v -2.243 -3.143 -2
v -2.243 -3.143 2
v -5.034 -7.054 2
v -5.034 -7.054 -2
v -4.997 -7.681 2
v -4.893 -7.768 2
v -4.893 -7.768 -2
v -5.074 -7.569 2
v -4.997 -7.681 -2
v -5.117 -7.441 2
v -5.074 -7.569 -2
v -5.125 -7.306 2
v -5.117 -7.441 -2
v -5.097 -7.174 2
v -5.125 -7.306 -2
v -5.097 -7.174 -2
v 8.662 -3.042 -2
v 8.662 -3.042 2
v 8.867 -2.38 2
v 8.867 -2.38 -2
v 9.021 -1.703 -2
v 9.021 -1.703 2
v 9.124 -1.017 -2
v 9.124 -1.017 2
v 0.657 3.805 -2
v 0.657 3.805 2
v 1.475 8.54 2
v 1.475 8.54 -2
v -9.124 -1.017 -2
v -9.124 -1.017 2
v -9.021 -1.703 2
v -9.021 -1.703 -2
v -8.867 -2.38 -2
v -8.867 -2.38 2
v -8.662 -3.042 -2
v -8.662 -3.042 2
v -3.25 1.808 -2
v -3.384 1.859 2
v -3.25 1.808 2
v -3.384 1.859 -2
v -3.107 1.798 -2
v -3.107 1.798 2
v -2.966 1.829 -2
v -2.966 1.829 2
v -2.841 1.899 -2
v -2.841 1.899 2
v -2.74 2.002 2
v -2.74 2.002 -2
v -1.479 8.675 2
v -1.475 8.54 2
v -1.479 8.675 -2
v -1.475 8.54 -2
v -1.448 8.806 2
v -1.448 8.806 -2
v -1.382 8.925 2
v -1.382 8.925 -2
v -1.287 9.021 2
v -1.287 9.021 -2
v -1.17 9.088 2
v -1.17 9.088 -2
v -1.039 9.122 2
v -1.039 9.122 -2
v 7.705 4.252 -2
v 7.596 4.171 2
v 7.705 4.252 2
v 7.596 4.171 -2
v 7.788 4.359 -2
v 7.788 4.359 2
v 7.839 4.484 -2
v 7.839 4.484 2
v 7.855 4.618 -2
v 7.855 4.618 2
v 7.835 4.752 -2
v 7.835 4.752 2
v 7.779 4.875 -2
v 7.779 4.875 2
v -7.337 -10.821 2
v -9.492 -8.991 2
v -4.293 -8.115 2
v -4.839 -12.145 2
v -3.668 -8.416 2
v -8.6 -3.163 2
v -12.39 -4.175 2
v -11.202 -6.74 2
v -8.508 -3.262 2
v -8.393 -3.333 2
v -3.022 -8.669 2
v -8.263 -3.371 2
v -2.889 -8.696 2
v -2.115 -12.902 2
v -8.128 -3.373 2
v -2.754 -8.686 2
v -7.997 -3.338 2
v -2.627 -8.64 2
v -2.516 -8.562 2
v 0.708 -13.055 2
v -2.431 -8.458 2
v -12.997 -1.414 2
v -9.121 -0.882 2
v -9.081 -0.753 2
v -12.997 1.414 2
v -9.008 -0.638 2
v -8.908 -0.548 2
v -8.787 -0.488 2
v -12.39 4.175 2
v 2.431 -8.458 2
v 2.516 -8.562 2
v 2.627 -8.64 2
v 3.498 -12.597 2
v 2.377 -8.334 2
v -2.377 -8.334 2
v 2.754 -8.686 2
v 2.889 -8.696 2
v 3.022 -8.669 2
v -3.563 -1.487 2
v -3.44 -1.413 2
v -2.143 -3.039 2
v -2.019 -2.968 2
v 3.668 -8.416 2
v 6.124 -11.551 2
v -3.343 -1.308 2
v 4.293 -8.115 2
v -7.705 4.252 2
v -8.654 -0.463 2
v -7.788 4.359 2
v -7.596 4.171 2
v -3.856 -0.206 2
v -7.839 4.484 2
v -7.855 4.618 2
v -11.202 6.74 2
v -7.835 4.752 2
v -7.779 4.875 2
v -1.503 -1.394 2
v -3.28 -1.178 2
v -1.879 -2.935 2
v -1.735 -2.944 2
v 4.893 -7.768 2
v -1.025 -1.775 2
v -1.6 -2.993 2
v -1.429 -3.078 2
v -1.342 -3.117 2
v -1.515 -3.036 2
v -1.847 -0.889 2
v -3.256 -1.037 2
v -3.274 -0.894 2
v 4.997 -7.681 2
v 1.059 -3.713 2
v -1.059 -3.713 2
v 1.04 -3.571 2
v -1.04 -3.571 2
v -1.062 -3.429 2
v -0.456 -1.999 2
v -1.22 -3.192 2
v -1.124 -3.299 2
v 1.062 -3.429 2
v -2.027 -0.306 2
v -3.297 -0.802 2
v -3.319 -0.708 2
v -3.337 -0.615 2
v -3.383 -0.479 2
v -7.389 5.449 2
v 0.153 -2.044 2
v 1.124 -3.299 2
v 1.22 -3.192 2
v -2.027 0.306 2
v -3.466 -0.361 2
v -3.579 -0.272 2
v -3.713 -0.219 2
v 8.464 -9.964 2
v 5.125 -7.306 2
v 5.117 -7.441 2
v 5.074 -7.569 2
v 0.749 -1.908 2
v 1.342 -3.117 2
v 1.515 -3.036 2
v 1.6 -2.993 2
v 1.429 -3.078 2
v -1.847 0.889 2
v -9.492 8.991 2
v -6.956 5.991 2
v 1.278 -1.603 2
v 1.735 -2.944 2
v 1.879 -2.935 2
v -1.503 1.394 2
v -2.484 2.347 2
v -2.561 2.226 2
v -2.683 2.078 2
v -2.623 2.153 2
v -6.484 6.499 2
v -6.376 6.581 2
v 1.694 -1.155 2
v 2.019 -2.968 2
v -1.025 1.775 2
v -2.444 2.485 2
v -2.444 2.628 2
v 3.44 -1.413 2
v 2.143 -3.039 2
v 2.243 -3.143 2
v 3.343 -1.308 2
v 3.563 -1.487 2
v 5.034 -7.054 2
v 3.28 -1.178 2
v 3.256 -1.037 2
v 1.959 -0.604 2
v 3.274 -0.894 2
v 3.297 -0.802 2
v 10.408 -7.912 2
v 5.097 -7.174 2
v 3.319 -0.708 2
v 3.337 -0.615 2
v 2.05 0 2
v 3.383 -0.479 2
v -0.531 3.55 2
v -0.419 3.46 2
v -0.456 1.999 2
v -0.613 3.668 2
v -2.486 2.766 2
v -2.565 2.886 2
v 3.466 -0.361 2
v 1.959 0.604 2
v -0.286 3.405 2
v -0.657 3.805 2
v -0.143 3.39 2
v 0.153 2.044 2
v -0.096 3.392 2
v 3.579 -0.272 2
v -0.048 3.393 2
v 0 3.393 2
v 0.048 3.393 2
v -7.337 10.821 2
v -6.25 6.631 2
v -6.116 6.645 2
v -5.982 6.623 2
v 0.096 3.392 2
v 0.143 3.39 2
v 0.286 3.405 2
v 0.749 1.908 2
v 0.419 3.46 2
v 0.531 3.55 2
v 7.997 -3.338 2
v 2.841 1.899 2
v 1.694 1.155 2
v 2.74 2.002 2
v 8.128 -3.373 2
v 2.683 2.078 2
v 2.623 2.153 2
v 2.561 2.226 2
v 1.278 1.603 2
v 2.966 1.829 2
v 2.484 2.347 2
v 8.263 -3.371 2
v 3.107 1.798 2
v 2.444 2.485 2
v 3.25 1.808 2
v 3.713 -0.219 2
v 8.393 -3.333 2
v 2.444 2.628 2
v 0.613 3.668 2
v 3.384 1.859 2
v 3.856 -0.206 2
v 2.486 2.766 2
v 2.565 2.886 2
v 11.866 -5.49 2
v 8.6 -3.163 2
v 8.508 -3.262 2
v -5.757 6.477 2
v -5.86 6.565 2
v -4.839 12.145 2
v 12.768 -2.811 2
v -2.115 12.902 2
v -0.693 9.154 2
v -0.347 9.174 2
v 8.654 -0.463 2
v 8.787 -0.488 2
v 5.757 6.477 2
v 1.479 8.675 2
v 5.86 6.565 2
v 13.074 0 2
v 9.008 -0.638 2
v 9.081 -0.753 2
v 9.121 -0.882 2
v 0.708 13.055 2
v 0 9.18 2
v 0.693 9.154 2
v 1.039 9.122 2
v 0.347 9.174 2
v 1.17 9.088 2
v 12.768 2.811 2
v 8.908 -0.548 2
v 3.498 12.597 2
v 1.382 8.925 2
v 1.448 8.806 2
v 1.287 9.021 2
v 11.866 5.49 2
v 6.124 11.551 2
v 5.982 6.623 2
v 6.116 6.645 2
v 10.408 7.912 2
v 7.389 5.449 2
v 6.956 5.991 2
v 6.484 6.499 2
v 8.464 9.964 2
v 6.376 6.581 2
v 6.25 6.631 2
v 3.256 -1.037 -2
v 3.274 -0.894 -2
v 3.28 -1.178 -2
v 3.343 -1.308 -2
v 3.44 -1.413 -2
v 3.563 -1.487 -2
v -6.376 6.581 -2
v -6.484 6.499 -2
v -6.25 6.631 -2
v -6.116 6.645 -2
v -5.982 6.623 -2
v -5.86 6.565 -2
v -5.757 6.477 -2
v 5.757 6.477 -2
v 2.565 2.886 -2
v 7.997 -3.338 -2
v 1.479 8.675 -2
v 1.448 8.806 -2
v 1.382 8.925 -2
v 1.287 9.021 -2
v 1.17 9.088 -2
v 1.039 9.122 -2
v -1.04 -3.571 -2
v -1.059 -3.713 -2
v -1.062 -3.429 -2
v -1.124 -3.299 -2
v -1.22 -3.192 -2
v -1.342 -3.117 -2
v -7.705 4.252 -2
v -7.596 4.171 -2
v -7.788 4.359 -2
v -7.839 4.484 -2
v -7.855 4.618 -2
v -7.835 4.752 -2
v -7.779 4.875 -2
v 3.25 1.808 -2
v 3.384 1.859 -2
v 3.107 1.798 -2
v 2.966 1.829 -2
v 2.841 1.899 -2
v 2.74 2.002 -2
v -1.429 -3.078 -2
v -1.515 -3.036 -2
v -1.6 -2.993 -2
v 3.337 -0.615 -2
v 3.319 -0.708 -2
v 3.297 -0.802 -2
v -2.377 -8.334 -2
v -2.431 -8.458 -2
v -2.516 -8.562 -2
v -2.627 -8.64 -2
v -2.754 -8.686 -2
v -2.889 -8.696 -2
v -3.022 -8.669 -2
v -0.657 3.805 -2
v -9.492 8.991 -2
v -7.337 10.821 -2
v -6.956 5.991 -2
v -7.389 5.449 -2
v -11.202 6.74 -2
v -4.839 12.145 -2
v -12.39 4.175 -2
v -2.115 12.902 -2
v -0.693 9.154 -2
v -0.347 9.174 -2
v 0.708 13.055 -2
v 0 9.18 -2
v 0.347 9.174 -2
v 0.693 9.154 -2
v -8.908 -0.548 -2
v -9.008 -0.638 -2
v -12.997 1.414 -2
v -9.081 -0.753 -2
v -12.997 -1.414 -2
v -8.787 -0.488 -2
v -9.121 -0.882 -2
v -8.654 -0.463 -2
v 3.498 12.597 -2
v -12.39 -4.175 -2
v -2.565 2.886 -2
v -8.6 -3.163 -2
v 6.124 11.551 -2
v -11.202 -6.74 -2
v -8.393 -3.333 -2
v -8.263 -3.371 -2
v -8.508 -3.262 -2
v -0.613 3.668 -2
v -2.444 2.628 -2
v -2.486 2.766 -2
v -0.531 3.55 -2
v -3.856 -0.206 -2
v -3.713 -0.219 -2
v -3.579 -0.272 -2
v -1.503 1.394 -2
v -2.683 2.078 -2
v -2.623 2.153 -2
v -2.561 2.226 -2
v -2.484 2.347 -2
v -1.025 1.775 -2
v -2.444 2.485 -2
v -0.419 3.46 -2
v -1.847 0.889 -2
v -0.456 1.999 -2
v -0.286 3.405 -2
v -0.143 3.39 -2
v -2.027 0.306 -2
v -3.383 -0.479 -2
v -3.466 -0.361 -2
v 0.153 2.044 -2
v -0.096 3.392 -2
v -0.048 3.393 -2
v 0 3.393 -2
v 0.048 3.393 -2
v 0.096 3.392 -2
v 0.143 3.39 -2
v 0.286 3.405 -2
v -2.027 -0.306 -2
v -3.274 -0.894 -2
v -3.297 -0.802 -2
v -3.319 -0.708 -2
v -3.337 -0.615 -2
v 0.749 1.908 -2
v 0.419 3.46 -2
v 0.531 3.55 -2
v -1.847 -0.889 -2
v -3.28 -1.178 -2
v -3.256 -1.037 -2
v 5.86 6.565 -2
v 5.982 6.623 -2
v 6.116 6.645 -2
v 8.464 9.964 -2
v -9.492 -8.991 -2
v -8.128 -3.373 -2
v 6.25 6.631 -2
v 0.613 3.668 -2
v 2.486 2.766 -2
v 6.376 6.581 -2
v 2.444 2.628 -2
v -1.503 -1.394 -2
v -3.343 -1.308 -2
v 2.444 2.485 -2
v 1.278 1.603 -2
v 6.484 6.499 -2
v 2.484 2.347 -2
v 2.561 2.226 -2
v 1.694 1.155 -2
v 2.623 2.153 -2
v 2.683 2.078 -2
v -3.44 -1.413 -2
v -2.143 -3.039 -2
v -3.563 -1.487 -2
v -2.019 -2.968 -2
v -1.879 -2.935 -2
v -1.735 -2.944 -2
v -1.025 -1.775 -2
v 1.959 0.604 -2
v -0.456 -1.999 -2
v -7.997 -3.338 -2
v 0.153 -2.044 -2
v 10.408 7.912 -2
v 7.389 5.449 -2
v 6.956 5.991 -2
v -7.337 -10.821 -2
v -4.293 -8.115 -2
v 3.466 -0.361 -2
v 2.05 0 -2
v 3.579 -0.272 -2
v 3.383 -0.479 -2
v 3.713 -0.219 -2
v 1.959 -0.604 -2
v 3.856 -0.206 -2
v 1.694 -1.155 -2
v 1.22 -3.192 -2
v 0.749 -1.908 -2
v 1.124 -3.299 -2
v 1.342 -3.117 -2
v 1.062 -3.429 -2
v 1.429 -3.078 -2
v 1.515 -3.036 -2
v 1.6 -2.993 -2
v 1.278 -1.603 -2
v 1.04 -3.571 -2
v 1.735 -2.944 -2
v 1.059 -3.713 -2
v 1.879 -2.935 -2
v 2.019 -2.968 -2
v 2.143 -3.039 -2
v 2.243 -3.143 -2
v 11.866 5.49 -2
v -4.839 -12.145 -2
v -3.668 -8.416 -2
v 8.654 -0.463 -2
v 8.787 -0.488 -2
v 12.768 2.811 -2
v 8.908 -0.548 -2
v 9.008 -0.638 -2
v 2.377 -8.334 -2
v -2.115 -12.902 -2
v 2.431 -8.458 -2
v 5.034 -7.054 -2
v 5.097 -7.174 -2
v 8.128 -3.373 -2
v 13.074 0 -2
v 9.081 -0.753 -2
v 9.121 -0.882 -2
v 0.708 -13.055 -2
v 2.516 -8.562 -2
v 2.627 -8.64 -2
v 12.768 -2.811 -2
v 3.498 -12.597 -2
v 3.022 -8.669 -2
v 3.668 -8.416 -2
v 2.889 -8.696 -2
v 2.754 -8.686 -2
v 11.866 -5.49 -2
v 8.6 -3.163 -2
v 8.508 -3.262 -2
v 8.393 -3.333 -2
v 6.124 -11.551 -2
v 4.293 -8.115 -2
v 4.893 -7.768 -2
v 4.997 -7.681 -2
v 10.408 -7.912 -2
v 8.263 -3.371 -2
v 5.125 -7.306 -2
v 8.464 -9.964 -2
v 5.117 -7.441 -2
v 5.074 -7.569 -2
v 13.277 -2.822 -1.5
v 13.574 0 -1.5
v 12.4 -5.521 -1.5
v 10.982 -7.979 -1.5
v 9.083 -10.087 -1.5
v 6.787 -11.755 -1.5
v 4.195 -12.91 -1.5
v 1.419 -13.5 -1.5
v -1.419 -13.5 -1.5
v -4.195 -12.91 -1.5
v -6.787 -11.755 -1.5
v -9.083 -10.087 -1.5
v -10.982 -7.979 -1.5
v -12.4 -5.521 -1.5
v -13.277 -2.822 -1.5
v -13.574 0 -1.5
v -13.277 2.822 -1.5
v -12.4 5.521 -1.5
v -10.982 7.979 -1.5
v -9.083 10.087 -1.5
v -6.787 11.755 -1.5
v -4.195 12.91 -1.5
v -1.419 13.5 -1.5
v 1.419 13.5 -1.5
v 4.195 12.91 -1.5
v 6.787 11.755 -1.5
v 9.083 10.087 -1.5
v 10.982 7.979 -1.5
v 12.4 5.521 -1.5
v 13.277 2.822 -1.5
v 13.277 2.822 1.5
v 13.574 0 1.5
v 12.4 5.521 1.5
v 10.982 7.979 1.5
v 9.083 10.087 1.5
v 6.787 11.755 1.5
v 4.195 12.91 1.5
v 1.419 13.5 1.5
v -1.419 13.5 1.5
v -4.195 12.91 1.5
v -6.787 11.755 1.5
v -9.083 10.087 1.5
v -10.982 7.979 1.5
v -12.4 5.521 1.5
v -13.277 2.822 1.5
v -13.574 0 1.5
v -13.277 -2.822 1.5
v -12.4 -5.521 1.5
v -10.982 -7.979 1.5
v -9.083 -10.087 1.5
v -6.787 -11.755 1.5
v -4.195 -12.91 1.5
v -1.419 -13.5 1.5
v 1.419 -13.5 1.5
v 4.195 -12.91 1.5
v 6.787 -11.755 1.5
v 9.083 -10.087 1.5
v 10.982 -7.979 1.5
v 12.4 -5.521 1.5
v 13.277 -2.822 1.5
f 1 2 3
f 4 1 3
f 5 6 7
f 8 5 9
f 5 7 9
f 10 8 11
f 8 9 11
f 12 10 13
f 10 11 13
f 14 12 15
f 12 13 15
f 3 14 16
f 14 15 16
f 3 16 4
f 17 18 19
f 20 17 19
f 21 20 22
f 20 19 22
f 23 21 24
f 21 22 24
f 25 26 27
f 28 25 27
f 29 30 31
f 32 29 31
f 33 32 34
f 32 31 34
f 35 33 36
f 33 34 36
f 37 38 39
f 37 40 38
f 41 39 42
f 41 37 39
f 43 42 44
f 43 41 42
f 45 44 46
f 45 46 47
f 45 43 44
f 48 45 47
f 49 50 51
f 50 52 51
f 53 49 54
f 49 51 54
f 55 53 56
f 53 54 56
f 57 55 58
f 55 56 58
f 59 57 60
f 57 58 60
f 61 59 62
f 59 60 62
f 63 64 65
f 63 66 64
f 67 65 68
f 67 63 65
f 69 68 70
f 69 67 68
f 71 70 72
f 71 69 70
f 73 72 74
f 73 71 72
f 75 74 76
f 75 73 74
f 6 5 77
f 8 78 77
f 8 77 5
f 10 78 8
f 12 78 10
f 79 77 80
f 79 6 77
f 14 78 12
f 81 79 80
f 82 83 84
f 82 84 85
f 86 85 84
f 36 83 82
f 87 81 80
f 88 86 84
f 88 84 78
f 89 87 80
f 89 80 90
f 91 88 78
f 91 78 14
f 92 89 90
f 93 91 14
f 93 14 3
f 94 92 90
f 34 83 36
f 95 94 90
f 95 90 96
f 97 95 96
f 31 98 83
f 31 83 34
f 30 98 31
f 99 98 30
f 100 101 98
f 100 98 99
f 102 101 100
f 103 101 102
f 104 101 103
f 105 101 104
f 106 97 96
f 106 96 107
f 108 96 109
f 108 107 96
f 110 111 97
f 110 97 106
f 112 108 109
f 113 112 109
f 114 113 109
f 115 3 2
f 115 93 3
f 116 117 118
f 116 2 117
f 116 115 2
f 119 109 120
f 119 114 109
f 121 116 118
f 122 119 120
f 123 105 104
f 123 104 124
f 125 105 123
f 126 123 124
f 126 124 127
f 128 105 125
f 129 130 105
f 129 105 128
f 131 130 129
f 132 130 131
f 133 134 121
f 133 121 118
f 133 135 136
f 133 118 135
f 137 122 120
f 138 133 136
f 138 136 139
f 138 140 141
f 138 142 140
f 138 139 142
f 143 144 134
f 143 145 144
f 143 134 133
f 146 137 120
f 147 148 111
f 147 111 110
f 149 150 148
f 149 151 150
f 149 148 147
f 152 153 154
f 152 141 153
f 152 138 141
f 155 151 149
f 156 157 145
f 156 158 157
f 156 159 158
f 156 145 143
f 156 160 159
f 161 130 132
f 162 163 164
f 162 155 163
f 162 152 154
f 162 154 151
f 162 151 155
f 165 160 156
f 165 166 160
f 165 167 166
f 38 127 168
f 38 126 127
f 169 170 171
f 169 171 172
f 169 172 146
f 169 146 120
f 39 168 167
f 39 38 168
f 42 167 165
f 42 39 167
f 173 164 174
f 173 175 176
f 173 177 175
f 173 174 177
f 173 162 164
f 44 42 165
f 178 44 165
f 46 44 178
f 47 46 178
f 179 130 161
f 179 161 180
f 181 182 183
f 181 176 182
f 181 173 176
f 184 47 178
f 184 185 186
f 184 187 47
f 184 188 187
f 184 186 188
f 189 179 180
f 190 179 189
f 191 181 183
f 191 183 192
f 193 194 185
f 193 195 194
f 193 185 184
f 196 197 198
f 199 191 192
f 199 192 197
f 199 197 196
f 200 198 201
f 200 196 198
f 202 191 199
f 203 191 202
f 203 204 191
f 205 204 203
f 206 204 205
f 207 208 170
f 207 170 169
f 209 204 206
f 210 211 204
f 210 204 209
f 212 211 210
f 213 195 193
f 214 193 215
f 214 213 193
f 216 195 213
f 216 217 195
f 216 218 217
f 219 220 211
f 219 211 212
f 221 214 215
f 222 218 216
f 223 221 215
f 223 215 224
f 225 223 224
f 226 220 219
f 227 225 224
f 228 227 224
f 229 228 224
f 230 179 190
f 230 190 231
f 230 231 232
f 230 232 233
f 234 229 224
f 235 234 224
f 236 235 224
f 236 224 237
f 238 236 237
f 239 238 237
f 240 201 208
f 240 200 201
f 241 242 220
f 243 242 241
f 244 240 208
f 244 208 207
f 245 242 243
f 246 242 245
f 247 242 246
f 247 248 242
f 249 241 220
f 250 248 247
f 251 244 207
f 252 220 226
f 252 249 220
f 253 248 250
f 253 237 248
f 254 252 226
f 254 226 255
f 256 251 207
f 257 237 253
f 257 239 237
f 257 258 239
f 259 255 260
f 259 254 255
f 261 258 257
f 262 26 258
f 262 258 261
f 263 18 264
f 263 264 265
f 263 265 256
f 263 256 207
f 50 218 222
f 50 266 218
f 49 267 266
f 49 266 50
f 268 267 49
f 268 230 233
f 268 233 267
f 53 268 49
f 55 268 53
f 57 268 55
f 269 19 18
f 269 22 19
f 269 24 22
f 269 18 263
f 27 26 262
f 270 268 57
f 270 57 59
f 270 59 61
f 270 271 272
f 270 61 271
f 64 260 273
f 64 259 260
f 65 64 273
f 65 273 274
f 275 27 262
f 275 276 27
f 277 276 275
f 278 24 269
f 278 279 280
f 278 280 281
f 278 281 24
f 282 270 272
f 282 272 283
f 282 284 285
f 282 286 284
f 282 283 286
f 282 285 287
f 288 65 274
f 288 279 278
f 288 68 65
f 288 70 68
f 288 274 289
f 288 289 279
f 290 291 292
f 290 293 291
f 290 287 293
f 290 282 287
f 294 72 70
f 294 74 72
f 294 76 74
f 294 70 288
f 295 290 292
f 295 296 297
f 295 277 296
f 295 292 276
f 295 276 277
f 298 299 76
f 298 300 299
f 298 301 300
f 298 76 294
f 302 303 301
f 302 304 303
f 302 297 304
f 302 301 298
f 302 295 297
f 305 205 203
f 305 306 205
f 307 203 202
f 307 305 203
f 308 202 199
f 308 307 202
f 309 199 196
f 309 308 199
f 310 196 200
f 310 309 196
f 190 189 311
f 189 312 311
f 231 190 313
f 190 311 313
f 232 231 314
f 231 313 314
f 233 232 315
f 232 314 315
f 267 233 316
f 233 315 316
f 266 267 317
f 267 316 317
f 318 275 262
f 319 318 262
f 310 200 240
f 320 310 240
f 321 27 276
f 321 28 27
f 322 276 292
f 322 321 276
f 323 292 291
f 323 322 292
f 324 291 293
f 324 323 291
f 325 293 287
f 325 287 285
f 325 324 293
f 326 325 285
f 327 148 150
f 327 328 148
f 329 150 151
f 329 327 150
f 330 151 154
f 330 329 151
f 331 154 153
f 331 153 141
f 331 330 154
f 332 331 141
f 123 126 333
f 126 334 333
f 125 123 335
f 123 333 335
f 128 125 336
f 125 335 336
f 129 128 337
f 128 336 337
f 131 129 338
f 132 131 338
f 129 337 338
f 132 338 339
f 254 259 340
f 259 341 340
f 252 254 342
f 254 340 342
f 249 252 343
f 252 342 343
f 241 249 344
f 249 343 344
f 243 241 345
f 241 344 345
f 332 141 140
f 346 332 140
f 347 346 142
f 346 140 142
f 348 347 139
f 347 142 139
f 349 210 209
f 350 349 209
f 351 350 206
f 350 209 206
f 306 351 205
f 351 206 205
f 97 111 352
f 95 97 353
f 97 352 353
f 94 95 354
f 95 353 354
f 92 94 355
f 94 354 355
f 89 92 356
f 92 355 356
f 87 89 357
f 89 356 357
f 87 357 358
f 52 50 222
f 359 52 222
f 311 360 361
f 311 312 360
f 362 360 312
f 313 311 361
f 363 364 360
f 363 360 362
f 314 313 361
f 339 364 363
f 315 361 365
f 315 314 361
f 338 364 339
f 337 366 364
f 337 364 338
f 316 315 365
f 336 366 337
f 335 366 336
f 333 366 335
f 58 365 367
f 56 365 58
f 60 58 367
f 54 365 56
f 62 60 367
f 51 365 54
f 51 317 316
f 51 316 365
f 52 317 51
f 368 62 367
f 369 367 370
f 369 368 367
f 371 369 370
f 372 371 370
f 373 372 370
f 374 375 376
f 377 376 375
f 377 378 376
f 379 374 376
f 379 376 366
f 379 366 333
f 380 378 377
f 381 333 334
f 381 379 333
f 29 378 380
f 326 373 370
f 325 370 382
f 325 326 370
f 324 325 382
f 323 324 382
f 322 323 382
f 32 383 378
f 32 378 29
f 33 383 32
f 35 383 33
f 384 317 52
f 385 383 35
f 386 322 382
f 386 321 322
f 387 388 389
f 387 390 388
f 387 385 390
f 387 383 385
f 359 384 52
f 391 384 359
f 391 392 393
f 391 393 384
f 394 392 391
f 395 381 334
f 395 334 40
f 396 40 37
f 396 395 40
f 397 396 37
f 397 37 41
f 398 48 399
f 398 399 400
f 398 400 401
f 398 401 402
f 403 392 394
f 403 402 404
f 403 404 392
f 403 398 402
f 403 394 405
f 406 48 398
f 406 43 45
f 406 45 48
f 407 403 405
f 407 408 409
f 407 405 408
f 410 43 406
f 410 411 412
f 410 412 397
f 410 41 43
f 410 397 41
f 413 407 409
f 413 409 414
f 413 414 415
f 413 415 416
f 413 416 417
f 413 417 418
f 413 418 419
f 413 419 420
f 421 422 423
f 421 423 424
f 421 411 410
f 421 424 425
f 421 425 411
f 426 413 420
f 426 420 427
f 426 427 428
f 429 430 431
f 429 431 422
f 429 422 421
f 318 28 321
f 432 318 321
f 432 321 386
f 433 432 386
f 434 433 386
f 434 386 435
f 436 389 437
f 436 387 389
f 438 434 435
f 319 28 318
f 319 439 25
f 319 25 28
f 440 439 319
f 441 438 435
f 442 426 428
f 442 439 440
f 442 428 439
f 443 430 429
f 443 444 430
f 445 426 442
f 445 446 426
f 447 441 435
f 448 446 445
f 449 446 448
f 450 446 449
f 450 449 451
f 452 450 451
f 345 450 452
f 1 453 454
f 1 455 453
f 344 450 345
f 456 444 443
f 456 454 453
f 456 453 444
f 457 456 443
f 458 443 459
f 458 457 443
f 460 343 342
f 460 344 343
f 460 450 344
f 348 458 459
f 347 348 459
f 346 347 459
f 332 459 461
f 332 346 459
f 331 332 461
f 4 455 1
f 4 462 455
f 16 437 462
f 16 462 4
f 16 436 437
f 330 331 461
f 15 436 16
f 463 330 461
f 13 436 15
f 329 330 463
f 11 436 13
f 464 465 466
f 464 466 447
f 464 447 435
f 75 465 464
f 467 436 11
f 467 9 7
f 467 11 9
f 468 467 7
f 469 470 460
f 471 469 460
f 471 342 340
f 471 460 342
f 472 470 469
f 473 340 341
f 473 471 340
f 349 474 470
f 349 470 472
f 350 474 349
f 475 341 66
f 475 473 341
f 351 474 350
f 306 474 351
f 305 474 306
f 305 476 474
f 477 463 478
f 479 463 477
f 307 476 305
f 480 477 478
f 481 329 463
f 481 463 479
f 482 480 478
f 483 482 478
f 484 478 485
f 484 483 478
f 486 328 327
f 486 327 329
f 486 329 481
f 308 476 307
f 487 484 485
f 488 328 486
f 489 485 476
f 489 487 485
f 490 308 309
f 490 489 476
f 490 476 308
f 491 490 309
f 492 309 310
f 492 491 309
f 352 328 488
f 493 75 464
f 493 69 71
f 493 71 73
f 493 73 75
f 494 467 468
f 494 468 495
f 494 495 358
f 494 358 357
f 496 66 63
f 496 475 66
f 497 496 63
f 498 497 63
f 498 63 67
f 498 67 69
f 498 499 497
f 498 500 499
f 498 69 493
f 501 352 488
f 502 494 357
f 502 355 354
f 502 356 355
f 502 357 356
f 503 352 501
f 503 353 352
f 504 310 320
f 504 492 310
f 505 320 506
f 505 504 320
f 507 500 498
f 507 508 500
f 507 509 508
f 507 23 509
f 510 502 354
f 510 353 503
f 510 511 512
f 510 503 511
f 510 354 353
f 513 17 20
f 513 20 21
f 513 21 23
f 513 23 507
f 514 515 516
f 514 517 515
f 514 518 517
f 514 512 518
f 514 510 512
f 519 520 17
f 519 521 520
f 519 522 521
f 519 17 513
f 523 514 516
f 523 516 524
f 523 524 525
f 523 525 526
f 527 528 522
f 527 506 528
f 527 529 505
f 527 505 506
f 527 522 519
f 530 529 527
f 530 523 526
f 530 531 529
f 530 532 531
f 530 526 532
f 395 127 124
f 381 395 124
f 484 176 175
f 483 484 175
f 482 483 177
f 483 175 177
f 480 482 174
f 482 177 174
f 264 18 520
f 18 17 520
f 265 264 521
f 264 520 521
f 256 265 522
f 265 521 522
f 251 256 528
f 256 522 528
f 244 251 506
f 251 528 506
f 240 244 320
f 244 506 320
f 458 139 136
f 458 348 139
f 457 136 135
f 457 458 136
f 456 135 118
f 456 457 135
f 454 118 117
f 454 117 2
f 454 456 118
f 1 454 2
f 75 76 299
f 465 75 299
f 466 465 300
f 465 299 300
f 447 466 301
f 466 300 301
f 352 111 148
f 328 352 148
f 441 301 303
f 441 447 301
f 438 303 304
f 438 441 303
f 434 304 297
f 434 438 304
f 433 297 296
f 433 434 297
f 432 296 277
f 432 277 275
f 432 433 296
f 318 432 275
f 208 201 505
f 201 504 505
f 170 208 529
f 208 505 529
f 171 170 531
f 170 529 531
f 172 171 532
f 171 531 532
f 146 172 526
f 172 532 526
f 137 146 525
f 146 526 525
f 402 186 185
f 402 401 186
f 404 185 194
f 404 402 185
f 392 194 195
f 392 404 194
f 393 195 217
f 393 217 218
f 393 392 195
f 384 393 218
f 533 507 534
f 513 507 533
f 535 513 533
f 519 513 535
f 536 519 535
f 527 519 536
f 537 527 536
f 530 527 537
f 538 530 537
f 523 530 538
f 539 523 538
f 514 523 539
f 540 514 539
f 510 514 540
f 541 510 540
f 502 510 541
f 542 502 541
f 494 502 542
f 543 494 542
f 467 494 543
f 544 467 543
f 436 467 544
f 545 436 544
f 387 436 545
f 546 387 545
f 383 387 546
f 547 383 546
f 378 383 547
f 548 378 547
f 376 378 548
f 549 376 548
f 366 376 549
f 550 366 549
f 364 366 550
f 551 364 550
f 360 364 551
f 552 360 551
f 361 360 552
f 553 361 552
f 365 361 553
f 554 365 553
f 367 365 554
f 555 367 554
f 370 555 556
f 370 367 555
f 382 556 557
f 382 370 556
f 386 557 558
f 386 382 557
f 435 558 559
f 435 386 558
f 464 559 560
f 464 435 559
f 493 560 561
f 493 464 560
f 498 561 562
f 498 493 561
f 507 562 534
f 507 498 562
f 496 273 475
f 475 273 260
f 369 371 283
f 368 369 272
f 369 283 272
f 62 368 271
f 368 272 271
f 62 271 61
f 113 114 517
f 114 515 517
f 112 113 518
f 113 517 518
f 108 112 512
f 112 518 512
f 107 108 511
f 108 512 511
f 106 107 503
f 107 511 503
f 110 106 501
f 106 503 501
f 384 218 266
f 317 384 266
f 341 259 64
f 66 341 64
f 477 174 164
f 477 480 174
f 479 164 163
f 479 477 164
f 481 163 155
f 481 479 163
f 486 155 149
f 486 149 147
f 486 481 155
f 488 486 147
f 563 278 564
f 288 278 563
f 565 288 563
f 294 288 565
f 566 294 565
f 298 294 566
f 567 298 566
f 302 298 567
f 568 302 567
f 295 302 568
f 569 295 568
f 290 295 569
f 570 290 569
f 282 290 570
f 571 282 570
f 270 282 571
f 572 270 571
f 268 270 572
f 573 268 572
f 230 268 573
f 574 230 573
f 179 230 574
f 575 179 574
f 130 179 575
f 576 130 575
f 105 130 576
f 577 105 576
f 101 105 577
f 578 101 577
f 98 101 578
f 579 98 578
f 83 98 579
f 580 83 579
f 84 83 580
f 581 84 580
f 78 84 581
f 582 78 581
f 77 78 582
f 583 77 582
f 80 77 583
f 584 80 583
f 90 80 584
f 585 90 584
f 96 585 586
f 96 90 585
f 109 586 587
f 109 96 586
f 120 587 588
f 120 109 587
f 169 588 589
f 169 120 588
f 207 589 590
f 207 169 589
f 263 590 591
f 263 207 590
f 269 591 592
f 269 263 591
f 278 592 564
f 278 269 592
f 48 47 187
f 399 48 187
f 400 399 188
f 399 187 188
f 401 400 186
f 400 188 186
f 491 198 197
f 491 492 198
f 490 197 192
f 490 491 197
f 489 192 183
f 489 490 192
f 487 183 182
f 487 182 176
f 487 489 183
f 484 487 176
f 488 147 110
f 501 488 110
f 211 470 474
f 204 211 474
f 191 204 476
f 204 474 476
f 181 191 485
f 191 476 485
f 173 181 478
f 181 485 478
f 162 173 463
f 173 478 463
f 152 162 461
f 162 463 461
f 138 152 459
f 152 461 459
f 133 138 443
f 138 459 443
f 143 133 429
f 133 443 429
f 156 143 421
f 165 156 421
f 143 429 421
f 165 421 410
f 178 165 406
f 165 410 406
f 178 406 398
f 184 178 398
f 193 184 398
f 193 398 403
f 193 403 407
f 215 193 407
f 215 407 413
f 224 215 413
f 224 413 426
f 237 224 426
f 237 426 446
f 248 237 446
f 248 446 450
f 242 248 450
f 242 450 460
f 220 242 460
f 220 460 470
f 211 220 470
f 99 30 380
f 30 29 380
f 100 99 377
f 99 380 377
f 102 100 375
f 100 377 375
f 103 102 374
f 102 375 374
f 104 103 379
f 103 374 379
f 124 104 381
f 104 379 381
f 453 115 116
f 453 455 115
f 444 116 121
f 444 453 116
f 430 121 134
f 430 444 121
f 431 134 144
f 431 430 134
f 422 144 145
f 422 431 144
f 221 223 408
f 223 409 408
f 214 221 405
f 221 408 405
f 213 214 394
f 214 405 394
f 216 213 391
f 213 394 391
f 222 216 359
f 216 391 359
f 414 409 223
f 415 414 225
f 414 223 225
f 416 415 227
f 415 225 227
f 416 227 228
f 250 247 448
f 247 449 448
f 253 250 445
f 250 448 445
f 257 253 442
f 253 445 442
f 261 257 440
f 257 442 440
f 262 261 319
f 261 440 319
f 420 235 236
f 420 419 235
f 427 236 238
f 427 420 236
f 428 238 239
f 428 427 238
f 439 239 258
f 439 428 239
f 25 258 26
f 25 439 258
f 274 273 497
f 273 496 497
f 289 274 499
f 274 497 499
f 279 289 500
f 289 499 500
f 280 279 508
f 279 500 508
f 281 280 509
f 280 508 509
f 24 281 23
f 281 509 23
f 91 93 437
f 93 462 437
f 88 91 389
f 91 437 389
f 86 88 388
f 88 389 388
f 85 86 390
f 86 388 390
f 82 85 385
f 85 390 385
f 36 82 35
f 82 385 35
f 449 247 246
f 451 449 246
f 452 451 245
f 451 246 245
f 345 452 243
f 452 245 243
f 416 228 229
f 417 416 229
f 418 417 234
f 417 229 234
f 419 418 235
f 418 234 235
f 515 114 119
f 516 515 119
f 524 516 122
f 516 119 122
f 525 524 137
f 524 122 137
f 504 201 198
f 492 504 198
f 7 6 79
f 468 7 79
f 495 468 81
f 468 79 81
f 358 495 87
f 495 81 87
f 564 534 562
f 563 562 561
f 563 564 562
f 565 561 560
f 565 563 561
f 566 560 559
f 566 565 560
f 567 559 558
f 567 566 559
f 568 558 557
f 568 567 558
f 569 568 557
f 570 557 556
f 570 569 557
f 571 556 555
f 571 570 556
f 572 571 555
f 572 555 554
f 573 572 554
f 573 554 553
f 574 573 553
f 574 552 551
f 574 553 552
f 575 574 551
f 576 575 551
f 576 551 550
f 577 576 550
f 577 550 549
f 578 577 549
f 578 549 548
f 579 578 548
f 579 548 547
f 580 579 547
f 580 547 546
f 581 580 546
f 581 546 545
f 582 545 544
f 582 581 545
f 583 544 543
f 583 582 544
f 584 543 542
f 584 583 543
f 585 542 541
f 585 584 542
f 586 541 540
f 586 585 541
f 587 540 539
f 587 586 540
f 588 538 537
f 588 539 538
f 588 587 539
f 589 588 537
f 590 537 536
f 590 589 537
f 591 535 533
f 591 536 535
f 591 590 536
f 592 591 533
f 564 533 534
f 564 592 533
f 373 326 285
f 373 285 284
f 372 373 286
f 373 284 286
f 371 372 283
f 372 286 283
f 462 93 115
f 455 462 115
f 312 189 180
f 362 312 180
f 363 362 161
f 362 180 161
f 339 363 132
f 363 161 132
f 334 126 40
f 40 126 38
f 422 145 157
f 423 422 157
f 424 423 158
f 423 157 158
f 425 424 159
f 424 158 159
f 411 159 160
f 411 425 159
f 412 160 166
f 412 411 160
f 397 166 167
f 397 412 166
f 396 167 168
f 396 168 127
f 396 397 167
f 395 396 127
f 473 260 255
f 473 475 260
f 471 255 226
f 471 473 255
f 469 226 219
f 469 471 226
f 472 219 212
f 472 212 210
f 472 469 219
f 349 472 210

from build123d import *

# Parameters (mm, degrees)
F0_R      = 13.57391
F1_DEPTH  = 17
F3_DEPTH  = 1.5
F5_DEPTH  = 34
F6_R      = 15.57391
F6_R_2    = 13.57391
F7_DEPTH  = 1.5
F8_SIZE2  = 0.99999
F8_SIZE   = 1.99999
F9_R      = 1
F12_R     = 13.57391
F12_R_2   = 10.57391
F13_DEPTH = 2
F15_R     = 13.57391
F15_R_2   = 10.57391
F16_DEPTH = 2
F17_SIZE  = 0.49999
F18_R     = 19.7740128031
F18_R_2   = 13.57391
F19_DEPTH = 100
F20_DEPTH = 15
F10_R     = 13.57391
F10_R_2   = 10.32391
F21_DEPTH = 15
F22_R     = 2.05
F23_DEPTH = 25
F24_R     = 0.5


# Not quite as in the source:
# - a fillet or chamfer is up to 0.001 mm smaller than in the source, because OpenCascade refuses the exact size
# - a feature names something its author has since deleted; it is built from what else it names


with BuildPart() as f1:
    # F0 (on Top) → F1 (new body, symmetric)
    with BuildSketch(Plane.XY):
        Circle(F0_R)
    extrude(amount=F1_DEPTH, both=True)

    # F2 (on Top) → F3 (join, symmetric)
    with BuildSketch(Plane.XY):
        with BuildLine():
            Line((-8.8722387473, 10.27299432), (-13.094084175, 11.721231689))
            ThreePointArc((-13.094084175, 11.721231689), (-13.7398361081, 10.9571536638), (-14.3410637787, 10.1575687241))
            Line((-14.3410637787, 10.1575687241), (-11.9896877566, 6.3638369077))
            ThreePointArc((-11.9896877566, 6.3638369077), (-10.6125101782, 8.4631944563), (-8.8722387473, 10.27299432))
        make_face()
        with BuildLine():
            ThreePointArc((1, 17.5454356654), (0, 17.57391), (-1, 17.5454356654))
            Line((-1, 17.5454356654), (-2.5, 13.3417027657))
            ThreePointArc((-2.5, 13.3417027657), (0, 13.57391), (2.5, 13.3417027657))
            Line((2.5, 13.3417027657), (1, 17.5454356654))
        make_face()
        with BuildLine():
            Line((11.9896877566, 6.3638369077), (14.3410637787, 10.1575687241))
            ThreePointArc((14.3410637787, 10.1575687241), (13.7398361081, 10.9571536638), (13.094084175, 11.721231689))
            Line((13.094084175, 11.721231689), (8.8722387473, 10.27299432))
            ThreePointArc((8.8722387473, 10.27299432), (10.6125101782, 8.4631944563), (11.9896877566, 6.3638369077))
        make_face()
        with BuildLine():
            Line((12.4508960874, -5.4061279404), (16.8830140276, -4.8791546431))
            ThreePointArc((16.8830140276, -4.8791546431), (17.1332953852, -3.9105628665), (17.3280558955, -2.9292988187))
            Line((17.3280558955, -2.9292988187), (13.5635007572, -0.5314883795))
            ThreePointArc((13.5635007572, -0.5314883795), (13.2335837364, -3.0204791306), (12.4508960874, -5.4061279404))
        make_face()
        with BuildLine():
            Line((3.5363257124, -13.1051681845), (6.711710363, -16.2417750474))
            ThreePointArc((6.711710363, -16.2417750474), (7.6250337817, -15.8335457973), (8.5136480988, -15.3740075692))
            Line((8.5136480988, -15.3740075692), (8.0411700519, -10.9357494889))
            ThreePointArc((8.0411700519, -10.9357494889), (5.8894988252, -12.2296703257), (3.5363257124, -13.1051681845))
        make_face()
        with BuildLine():
            Line((-8.0411700519, -10.9357494889), (-8.5136480988, -15.3740075692))
            ThreePointArc((-8.5136480988, -15.3740075692), (-7.6250337817, -15.8335457973), (-6.711710363, -16.2417750474))
            Line((-6.711710363, -16.2417750474), (-3.5363257124, -13.1051681845))
            ThreePointArc((-3.5363257124, -13.1051681845), (-5.8894988252, -12.2296703257), (-8.0411700519, -10.9357494889))
        make_face()
        with BuildLine():
            Line((-13.5635007572, -0.5314883795), (-17.3280558955, -2.9292988187))
            ThreePointArc((-17.3280558955, -2.9292988187), (-17.1332953852, -3.9105628665), (-16.8830140276, -4.8791546431))
            Line((-16.8830140276, -4.8791546431), (-12.4508960874, -5.4061279404))
            ThreePointArc((-12.4508960874, -5.4061279404), (-13.2335837364, -3.0204791306), (-13.5635007572, -0.5314883795))
        make_face()
    extrude(amount=F3_DEPTH, both=True)

    # F4 (on face) → F5 (cut)
    with BuildSketch(Plane.XY.offset(17)):
        with BuildLine():
            ThreePointArc((-0.5774653997, 3.3439831422), (-0.2897912953, 3.3810812691), (0, 3.3934775))
            Line((0, 3.3934775), (0, 6.786955))
            Line((0, 6.786955), (0, 9.1804325))
            ThreePointArc((0, 9.1804325), (-0.7839773287, 9.1468967653), (-1.5622269849, 9.0465345705))
            Line((-1.5622269849, 9.0465345705), (-0.5774653997, 3.3439831422))
        make_face()
        with BuildLine():
            Line((0, 6.786955), (0, 3.3934775))
            ThreePointArc((0, 3.3934775), (0.2897912953, 3.3810812691), (0.5774653997, 3.3439831422))
            Line((0.5774653997, 3.3439831422), (1.5622269849, 9.0465345705))
            ThreePointArc((1.5622269849, 9.0465345705), (0.7839773287, 9.1468967653), (0, 9.1804325))
            Line((0, 9.1804325), (0, 6.786955))
        make_face()
        Polygon((-1.2990381057, 0.7133780277), (0, 0), (-0.8810810246, 0.9913076333), (-1.2990381057, 0.75), align=None)
        Polygon((-0.8810810246, 0.9913076333), (0, 0), (-0.2355474293, 1.3640066283), align=None)
        Polygon((-0.2355474293, 1.3640066283), (0, 0), (0, 1.5), align=None)
        Polygon((0, 1.5), (0, 0), (0.2355474293, 1.3640066283), align=None)
        Polygon((0.2355474293, 1.3640066283), (0, 0), (0.8810810246, 0.9913076333), align=None)
        Polygon((0.8810810246, 0.9913076333), (0, 0), (1.2990381057, 0.7133780277), (1.2990381057, 0.75), align=None)
        Polygon((1.2990381057, -0.5421957037), (0, 0), (0.7580809189, -1.0623217774), (1.2990381057, -0.75), align=None)
        Polygon((0.3672856493, -1.2879475315), (0, 0), (-0.3672856493, -1.2879475315), (0, -1.5), align=None)
        Polygon((-0.7580809189, -1.0623217774), (0, 0), (-1.2990381057, -0.5421957037), (-1.2990381057, -0.75), align=None)
        with BuildLine():
            Line((-8.0468981277, 4.4190238073), (-2.974475085, 1.6334587572))
            ThreePointArc((-2.974475085, 1.6334587572), (-2.6531275445, 2.1157986141), (-2.2543875098, 2.5364200163))
            Line((-2.2543875098, 2.5364200163), (-6.0988329412, 6.8618202864))
            ThreePointArc((-6.0988329412, 6.8618202864), (-7.1775511512, 5.7239060404), (-8.0468981277, 4.4190238073))
        make_face()
        with BuildLine():
            Line((6.0988329412, 6.8618202864), (2.2543875098, 2.5364200163))
            ThreePointArc((2.2543875098, 2.5364200163), (2.6531275445, 2.1157986141), (2.974475085, 1.6334587572))
            Line((2.974475085, 1.6334587572), (8.0468981277, 4.4190238073))
            ThreePointArc((8.0468981277, 4.4190238073), (7.1775511512, 5.7239060404), (6.0988329412, 6.8618202864))
        make_face()
        with BuildLine():
            Line((9.167347269, -0.489984629), (3.3886406432, -0.1811191154))
            ThreePointArc((3.3886406432, -0.1811191154), (3.3083959341, -0.7551197827), (3.1316443631, -1.3070933884))
            Line((3.1316443631, -1.3070933884), (8.4720908536, -3.5361020144))
            ThreePointArc((8.4720908536, -3.5361020144), (8.9502598902, -2.042838414), (9.167347269, -0.489984629))
        make_face()
        with BuildLine():
            Line((-8.4720908536, -3.5361020144), (-3.1316443631, -1.3070933884))
            ThreePointArc((-3.1316443631, -1.3070933884), (-3.3083959341, -0.7551197827), (-3.3886406432, -0.1811191154))
            Line((-3.3886406432, -0.1811191154), (-9.167347269, -0.489984629))
            ThreePointArc((-9.167347269, -0.489984629), (-8.9502598902, -2.042838414), (-8.4720908536, -3.5361020144))
        make_face()
        with BuildLine():
            Line((-2.5176263675, -8.8284708959), (-0.9306215619, -3.2633775527))
            ThreePointArc((-0.9306215619, -3.2633775527), (-1.4723747063, -3.0574175814), (-1.9711782567, -2.7622718591))
            Line((-1.9711782567, -2.7622718591), (-5.3326621235, -7.4728211249))
            ThreePointArc((-5.3326621235, -7.4728211249), (-3.9832403798, -8.2712838764), (-2.5176263675, -8.8284708959))
        make_face()
        with BuildLine():
            Line((5.3326621235, -7.4728211249), (1.9711782567, -2.7622718591))
            ThreePointArc((1.9711782567, -2.7622718591), (1.4723747063, -3.0574175814), (0.9306215619, -3.2633775527))
            Line((0.9306215619, -3.2633775527), (2.5176263675, -8.8284708959))
            ThreePointArc((2.5176263675, -8.8284708959), (3.9832403798, -8.2712838764), (5.3326621235, -7.4728211249))
        make_face()
    extrude(amount=-F5_DEPTH, mode=Mode.SUBTRACT)

    # F6 (on face) → F7 (join)
    with BuildSketch(Plane(origin=(0, 0, -17), x_dir=(1, 0, 0), z_dir=(0, 0, -1))):
        Circle(F6_R)
        Circle(F6_R_2, mode=Mode.SUBTRACT)
    extrude(amount=-F7_DEPTH)

    # F8 (size 2 and 1 in the source; OpenCascade refuses exactly that, so slightly less here)
    f8_edges = [f1.edges().sort_by_distance(p)[0] for p in [
        (-15.57391, 0, -15.5),
    ]]
    f8_side = f1.faces().sort_by_distance((-15.133413, 0, -15.5))[0]
    chamfer(f8_edges, length=F8_SIZE, length2=F8_SIZE2, reference=f8_side)

    # F9
    f9_edges = [f1.edges().sort_by_distance(p)[0] for p in [
        (14.341064, 10.157569, 0),
        (13.094084, 11.721232, 0),
        (1, 17.545436, 0),
        (-1, 17.545436, 0),
        (-13.094084, 11.721232, 0),
        (-14.341064, 10.157569, 0),
        (-17.328056, -2.929299, 0),
        (-16.883014, -4.879155, 0),
        (-8.513648, -15.374008, 0),
        (-6.71171, -16.241775, 0),
        (6.71171, -16.241775, 0),
        (8.513648, -15.374008, 0),
        (16.883014, -4.879155, 0),
        (17.328056, -2.929299, 0),
    ]]
    fillet(f9_edges, radius=F9_R)

    # F12 (on offset) → F13 (cut)
    with BuildSketch(Plane.XY.offset(2)):
        Circle(F12_R)
        Circle(F12_R_2, mode=Mode.SUBTRACT)
    extrude(amount=F13_DEPTH, mode=Mode.SUBTRACT)

    # F15 (on offset) → F16 (cut)
    with BuildSketch(Plane(origin=(0, 0, -2), x_dir=(1, 0, 0), z_dir=(0, 0, -1))):
        Circle(F15_R)
        Circle(F15_R_2, mode=Mode.SUBTRACT)
    extrude(amount=F16_DEPTH, mode=Mode.SUBTRACT)

    # F17 (size 0.5 in the source; OpenCascade refuses exactly that, so slightly less here)
    f17_edges = [f1.edges().sort_by_distance(p)[0] for p in [
        (-13.57391, 0, -4),
        (-13.57391, 0, -2),
        (-13.57391, 0, 2),
        (-13.57391, 0, 4),
    ]]
    chamfer(f17_edges, length=F17_SIZE)

    # F18 (on face) → F19 (cut)
    with BuildSketch(Plane.XY.offset(17)):
        Circle(F18_R)
        Circle(F18_R_2, mode=Mode.SUBTRACT)
    extrude(amount=-F19_DEPTH, mode=Mode.SUBTRACT)

    # F20 (cut): a face of the model
    f20_faces = [f1.faces().sort_by_distance(p)[0] for p in [
        (-13.1899818477, 0, 17),
    ]]
    extrude(f20_faces, amount=-F20_DEPTH, mode=Mode.SUBTRACT)

    # F10 (on face) → F21 (cut)
    with BuildSketch(Plane(origin=(0, 0, -17), x_dir=(1, 0, 0), z_dir=(0, 0, -1))):
        Circle(F10_R)
        Circle(F10_R_2, mode=Mode.SUBTRACT)
        Circle(F10_R_2)
        with BuildLine():
            Line((-2.2543875098, -2.5364200163), (-6.0988329412, -6.8618202864))
            ThreePointArc((-6.0988329412, -6.8618202864), (-7.1775511512, -5.7239060404), (-8.0468981277, -4.4190238073))
            Line((-8.0468981277, -4.4190238073), (-2.974475085, -1.6334587572))
            ThreePointArc((-2.974475085, -1.6334587572), (-2.6531275445, -2.1157986141), (-2.2543875098, -2.5364200163))
        make_face(mode=Mode.SUBTRACT)
        with BuildLine():
            ThreePointArc((-0.5774653997, -3.3439831422), (0, -3.3934775), (0.5774653997, -3.3439831422))
            Line((0.5774653997, -3.3439831422), (1.5622269849, -9.0465345705))
            ThreePointArc((1.5622269849, -9.0465345705), (0, -9.1804325), (-1.5622269849, -9.0465345705))
            Line((-1.5622269849, -9.0465345705), (-0.5774653997, -3.3439831422))
        make_face(mode=Mode.SUBTRACT)
        with BuildLine():
            ThreePointArc((8.0468981277, -4.4190238073), (7.1775511512, -5.7239060404), (6.0988329412, -6.8618202864))
            Line((6.0988329412, -6.8618202864), (2.2543875098, -2.5364200163))
            ThreePointArc((2.2543875098, -2.5364200163), (2.6531275445, -2.1157986141), (2.974475085, -1.6334587572))
            Line((2.974475085, -1.6334587572), (8.0468981277, -4.4190238073))
        make_face(mode=Mode.SUBTRACT)
        Polygon((-1.2990381057, -0.7133780277), (0, 0), (1.2990381057, -0.7133780277), (1.2990381057, -0.75), (0, -1.5), (-1.2990381057, -0.75), align=None, mode=Mode.SUBTRACT)
        with BuildLine():
            Line((-3.3886406432, 0.1811191154), (-9.167347269, 0.489984629))
            ThreePointArc((-9.167347269, 0.489984629), (-8.9502598902, 2.042838414), (-8.4720908536, 3.5361020144))
            Line((-8.4720908536, 3.5361020144), (-3.1316443631, 1.3070933884))
            ThreePointArc((-3.1316443631, 1.3070933884), (-3.3083959341, 0.7551197827), (-3.3886406432, 0.1811191154))
        make_face(mode=Mode.SUBTRACT)
        Polygon((-0.7580809189, 1.0623217774), (0, 0), (-1.2990381057, 0.5421957037), (-1.2990381057, 0.75), align=None, mode=Mode.SUBTRACT)
        with BuildLine():
            Line((-1.9711782567, 2.7622718591), (-5.3326621235, 7.4728211249))
            ThreePointArc((-5.3326621235, 7.4728211249), (-3.9832403798, 8.2712838764), (-2.5176263675, 8.8284708959))
            Line((-2.5176263675, 8.8284708959), (-0.9306215619, 3.2633775527))
            ThreePointArc((-0.9306215619, 3.2633775527), (-1.4723747063, 3.0574175814), (-1.9711782567, 2.7622718591))
        make_face(mode=Mode.SUBTRACT)
        Polygon((0.3672856493, 1.2879475315), (0, 0), (-0.3672856493, 1.2879475315), (0, 1.5), align=None, mode=Mode.SUBTRACT)
        Polygon((1.2990381057, 0.5421957037), (0, 0), (0.7580809189, 1.0623217774), (1.2990381057, 0.75), align=None, mode=Mode.SUBTRACT)
        with BuildLine():
            Line((3.1316443631, 1.3070933884), (8.4720908536, 3.5361020144))
            ThreePointArc((8.4720908536, 3.5361020144), (8.9502598902, 2.042838414), (9.167347269, 0.489984629))
            Line((9.167347269, 0.489984629), (3.3886406432, 0.1811191154))
            ThreePointArc((3.3886406432, 0.1811191154), (3.3083959341, 0.7551197827), (3.1316443631, 1.3070933884))
        make_face(mode=Mode.SUBTRACT)
        with BuildLine():
            Line((0.9306215619, 3.2633775527), (2.5176263675, 8.8284708959))
            ThreePointArc((2.5176263675, 8.8284708959), (3.9832403798, 8.2712838764), (5.3326621235, 7.4728211249))
            Line((5.3326621235, 7.4728211249), (1.9711782567, 2.7622718591))
            ThreePointArc((1.9711782567, 2.7622718591), (1.4723747063, 3.0574175814), (0.9306215619, 3.2633775527))
        make_face(mode=Mode.SUBTRACT)
    extrude(amount=-F21_DEPTH, mode=Mode.SUBTRACT)

    # F22 (on face) → F23 (cut)
    with BuildSketch(Plane(origin=(0, 0, -2), x_dir=(1, 0, 0), z_dir=(0, 0, -1))):
        Circle(F22_R)
        Polygon((-1.2990381057, -0.7133780277), (0, 0), (1.2990381057, -0.7133780277), (1.2990381057, -0.75), (0, -1.5), (-1.2990381057, -0.75), align=None, mode=Mode.SUBTRACT)
        Polygon((-0.7580809189, 1.0623217774), (0, 0), (-1.2990381057, 0.5421957037), (-1.2990381057, 0.75), align=None, mode=Mode.SUBTRACT)
        Polygon((0.3672856493, 1.2879475315), (0, 0), (-0.3672856493, 1.2879475315), (0, 1.5), align=None, mode=Mode.SUBTRACT)
        Polygon((1.2990381057, 0.5421957037), (0, 0), (0.7580809189, 1.0623217774), (1.2990381057, 0.75), align=None, mode=Mode.SUBTRACT)
    extrude(amount=-F23_DEPTH, mode=Mode.SUBTRACT)

    # F24
    f24_edges = [f1.edges().sort_by_distance(p)[0] for p in [
        (-1.971178, -2.762272, 0),
        (-0.930622, -3.263378, 0),
        (1.971178, -2.762272, 0),
        (0.930622, -3.263378, 0),
        (3.388641, -0.181119, 0),
        (3.131644, -1.307093, 0),
        (2.254388, 2.53642, 0),
        (2.974475, 1.633459, 0),
        (-0.577465, 3.343983, 0),
        (0.577465, 3.343983, 0),
        (-2.254388, 2.53642, 0),
        (-2.974475, 1.633459, 0),
        (-3.388641, -0.181119, 0),
        (-3.131644, -1.307093, 0),
        (-9.167347, -0.489985, 0),
        (-8.472091, -3.536102, 0),
        (-8.046898, 4.419024, 0),
        (-6.098833, 6.86182, 0),
        (-1.562227, 9.046535, 0),
        (1.562227, 9.046535, 0),
        (6.098833, 6.86182, 0),
        (8.046898, 4.419024, 0),
        (9.167347, -0.489985, 0),
        (8.472091, -3.536102, 0),
        (5.332662, -7.472821, 0),
        (2.517626, -8.828471, 0),
        (-2.517626, -8.828471, 0),
        (-5.332662, -7.472821, 0),
    ]]
    fillet(f24_edges, radius=F24_R)


solid = f1.part
